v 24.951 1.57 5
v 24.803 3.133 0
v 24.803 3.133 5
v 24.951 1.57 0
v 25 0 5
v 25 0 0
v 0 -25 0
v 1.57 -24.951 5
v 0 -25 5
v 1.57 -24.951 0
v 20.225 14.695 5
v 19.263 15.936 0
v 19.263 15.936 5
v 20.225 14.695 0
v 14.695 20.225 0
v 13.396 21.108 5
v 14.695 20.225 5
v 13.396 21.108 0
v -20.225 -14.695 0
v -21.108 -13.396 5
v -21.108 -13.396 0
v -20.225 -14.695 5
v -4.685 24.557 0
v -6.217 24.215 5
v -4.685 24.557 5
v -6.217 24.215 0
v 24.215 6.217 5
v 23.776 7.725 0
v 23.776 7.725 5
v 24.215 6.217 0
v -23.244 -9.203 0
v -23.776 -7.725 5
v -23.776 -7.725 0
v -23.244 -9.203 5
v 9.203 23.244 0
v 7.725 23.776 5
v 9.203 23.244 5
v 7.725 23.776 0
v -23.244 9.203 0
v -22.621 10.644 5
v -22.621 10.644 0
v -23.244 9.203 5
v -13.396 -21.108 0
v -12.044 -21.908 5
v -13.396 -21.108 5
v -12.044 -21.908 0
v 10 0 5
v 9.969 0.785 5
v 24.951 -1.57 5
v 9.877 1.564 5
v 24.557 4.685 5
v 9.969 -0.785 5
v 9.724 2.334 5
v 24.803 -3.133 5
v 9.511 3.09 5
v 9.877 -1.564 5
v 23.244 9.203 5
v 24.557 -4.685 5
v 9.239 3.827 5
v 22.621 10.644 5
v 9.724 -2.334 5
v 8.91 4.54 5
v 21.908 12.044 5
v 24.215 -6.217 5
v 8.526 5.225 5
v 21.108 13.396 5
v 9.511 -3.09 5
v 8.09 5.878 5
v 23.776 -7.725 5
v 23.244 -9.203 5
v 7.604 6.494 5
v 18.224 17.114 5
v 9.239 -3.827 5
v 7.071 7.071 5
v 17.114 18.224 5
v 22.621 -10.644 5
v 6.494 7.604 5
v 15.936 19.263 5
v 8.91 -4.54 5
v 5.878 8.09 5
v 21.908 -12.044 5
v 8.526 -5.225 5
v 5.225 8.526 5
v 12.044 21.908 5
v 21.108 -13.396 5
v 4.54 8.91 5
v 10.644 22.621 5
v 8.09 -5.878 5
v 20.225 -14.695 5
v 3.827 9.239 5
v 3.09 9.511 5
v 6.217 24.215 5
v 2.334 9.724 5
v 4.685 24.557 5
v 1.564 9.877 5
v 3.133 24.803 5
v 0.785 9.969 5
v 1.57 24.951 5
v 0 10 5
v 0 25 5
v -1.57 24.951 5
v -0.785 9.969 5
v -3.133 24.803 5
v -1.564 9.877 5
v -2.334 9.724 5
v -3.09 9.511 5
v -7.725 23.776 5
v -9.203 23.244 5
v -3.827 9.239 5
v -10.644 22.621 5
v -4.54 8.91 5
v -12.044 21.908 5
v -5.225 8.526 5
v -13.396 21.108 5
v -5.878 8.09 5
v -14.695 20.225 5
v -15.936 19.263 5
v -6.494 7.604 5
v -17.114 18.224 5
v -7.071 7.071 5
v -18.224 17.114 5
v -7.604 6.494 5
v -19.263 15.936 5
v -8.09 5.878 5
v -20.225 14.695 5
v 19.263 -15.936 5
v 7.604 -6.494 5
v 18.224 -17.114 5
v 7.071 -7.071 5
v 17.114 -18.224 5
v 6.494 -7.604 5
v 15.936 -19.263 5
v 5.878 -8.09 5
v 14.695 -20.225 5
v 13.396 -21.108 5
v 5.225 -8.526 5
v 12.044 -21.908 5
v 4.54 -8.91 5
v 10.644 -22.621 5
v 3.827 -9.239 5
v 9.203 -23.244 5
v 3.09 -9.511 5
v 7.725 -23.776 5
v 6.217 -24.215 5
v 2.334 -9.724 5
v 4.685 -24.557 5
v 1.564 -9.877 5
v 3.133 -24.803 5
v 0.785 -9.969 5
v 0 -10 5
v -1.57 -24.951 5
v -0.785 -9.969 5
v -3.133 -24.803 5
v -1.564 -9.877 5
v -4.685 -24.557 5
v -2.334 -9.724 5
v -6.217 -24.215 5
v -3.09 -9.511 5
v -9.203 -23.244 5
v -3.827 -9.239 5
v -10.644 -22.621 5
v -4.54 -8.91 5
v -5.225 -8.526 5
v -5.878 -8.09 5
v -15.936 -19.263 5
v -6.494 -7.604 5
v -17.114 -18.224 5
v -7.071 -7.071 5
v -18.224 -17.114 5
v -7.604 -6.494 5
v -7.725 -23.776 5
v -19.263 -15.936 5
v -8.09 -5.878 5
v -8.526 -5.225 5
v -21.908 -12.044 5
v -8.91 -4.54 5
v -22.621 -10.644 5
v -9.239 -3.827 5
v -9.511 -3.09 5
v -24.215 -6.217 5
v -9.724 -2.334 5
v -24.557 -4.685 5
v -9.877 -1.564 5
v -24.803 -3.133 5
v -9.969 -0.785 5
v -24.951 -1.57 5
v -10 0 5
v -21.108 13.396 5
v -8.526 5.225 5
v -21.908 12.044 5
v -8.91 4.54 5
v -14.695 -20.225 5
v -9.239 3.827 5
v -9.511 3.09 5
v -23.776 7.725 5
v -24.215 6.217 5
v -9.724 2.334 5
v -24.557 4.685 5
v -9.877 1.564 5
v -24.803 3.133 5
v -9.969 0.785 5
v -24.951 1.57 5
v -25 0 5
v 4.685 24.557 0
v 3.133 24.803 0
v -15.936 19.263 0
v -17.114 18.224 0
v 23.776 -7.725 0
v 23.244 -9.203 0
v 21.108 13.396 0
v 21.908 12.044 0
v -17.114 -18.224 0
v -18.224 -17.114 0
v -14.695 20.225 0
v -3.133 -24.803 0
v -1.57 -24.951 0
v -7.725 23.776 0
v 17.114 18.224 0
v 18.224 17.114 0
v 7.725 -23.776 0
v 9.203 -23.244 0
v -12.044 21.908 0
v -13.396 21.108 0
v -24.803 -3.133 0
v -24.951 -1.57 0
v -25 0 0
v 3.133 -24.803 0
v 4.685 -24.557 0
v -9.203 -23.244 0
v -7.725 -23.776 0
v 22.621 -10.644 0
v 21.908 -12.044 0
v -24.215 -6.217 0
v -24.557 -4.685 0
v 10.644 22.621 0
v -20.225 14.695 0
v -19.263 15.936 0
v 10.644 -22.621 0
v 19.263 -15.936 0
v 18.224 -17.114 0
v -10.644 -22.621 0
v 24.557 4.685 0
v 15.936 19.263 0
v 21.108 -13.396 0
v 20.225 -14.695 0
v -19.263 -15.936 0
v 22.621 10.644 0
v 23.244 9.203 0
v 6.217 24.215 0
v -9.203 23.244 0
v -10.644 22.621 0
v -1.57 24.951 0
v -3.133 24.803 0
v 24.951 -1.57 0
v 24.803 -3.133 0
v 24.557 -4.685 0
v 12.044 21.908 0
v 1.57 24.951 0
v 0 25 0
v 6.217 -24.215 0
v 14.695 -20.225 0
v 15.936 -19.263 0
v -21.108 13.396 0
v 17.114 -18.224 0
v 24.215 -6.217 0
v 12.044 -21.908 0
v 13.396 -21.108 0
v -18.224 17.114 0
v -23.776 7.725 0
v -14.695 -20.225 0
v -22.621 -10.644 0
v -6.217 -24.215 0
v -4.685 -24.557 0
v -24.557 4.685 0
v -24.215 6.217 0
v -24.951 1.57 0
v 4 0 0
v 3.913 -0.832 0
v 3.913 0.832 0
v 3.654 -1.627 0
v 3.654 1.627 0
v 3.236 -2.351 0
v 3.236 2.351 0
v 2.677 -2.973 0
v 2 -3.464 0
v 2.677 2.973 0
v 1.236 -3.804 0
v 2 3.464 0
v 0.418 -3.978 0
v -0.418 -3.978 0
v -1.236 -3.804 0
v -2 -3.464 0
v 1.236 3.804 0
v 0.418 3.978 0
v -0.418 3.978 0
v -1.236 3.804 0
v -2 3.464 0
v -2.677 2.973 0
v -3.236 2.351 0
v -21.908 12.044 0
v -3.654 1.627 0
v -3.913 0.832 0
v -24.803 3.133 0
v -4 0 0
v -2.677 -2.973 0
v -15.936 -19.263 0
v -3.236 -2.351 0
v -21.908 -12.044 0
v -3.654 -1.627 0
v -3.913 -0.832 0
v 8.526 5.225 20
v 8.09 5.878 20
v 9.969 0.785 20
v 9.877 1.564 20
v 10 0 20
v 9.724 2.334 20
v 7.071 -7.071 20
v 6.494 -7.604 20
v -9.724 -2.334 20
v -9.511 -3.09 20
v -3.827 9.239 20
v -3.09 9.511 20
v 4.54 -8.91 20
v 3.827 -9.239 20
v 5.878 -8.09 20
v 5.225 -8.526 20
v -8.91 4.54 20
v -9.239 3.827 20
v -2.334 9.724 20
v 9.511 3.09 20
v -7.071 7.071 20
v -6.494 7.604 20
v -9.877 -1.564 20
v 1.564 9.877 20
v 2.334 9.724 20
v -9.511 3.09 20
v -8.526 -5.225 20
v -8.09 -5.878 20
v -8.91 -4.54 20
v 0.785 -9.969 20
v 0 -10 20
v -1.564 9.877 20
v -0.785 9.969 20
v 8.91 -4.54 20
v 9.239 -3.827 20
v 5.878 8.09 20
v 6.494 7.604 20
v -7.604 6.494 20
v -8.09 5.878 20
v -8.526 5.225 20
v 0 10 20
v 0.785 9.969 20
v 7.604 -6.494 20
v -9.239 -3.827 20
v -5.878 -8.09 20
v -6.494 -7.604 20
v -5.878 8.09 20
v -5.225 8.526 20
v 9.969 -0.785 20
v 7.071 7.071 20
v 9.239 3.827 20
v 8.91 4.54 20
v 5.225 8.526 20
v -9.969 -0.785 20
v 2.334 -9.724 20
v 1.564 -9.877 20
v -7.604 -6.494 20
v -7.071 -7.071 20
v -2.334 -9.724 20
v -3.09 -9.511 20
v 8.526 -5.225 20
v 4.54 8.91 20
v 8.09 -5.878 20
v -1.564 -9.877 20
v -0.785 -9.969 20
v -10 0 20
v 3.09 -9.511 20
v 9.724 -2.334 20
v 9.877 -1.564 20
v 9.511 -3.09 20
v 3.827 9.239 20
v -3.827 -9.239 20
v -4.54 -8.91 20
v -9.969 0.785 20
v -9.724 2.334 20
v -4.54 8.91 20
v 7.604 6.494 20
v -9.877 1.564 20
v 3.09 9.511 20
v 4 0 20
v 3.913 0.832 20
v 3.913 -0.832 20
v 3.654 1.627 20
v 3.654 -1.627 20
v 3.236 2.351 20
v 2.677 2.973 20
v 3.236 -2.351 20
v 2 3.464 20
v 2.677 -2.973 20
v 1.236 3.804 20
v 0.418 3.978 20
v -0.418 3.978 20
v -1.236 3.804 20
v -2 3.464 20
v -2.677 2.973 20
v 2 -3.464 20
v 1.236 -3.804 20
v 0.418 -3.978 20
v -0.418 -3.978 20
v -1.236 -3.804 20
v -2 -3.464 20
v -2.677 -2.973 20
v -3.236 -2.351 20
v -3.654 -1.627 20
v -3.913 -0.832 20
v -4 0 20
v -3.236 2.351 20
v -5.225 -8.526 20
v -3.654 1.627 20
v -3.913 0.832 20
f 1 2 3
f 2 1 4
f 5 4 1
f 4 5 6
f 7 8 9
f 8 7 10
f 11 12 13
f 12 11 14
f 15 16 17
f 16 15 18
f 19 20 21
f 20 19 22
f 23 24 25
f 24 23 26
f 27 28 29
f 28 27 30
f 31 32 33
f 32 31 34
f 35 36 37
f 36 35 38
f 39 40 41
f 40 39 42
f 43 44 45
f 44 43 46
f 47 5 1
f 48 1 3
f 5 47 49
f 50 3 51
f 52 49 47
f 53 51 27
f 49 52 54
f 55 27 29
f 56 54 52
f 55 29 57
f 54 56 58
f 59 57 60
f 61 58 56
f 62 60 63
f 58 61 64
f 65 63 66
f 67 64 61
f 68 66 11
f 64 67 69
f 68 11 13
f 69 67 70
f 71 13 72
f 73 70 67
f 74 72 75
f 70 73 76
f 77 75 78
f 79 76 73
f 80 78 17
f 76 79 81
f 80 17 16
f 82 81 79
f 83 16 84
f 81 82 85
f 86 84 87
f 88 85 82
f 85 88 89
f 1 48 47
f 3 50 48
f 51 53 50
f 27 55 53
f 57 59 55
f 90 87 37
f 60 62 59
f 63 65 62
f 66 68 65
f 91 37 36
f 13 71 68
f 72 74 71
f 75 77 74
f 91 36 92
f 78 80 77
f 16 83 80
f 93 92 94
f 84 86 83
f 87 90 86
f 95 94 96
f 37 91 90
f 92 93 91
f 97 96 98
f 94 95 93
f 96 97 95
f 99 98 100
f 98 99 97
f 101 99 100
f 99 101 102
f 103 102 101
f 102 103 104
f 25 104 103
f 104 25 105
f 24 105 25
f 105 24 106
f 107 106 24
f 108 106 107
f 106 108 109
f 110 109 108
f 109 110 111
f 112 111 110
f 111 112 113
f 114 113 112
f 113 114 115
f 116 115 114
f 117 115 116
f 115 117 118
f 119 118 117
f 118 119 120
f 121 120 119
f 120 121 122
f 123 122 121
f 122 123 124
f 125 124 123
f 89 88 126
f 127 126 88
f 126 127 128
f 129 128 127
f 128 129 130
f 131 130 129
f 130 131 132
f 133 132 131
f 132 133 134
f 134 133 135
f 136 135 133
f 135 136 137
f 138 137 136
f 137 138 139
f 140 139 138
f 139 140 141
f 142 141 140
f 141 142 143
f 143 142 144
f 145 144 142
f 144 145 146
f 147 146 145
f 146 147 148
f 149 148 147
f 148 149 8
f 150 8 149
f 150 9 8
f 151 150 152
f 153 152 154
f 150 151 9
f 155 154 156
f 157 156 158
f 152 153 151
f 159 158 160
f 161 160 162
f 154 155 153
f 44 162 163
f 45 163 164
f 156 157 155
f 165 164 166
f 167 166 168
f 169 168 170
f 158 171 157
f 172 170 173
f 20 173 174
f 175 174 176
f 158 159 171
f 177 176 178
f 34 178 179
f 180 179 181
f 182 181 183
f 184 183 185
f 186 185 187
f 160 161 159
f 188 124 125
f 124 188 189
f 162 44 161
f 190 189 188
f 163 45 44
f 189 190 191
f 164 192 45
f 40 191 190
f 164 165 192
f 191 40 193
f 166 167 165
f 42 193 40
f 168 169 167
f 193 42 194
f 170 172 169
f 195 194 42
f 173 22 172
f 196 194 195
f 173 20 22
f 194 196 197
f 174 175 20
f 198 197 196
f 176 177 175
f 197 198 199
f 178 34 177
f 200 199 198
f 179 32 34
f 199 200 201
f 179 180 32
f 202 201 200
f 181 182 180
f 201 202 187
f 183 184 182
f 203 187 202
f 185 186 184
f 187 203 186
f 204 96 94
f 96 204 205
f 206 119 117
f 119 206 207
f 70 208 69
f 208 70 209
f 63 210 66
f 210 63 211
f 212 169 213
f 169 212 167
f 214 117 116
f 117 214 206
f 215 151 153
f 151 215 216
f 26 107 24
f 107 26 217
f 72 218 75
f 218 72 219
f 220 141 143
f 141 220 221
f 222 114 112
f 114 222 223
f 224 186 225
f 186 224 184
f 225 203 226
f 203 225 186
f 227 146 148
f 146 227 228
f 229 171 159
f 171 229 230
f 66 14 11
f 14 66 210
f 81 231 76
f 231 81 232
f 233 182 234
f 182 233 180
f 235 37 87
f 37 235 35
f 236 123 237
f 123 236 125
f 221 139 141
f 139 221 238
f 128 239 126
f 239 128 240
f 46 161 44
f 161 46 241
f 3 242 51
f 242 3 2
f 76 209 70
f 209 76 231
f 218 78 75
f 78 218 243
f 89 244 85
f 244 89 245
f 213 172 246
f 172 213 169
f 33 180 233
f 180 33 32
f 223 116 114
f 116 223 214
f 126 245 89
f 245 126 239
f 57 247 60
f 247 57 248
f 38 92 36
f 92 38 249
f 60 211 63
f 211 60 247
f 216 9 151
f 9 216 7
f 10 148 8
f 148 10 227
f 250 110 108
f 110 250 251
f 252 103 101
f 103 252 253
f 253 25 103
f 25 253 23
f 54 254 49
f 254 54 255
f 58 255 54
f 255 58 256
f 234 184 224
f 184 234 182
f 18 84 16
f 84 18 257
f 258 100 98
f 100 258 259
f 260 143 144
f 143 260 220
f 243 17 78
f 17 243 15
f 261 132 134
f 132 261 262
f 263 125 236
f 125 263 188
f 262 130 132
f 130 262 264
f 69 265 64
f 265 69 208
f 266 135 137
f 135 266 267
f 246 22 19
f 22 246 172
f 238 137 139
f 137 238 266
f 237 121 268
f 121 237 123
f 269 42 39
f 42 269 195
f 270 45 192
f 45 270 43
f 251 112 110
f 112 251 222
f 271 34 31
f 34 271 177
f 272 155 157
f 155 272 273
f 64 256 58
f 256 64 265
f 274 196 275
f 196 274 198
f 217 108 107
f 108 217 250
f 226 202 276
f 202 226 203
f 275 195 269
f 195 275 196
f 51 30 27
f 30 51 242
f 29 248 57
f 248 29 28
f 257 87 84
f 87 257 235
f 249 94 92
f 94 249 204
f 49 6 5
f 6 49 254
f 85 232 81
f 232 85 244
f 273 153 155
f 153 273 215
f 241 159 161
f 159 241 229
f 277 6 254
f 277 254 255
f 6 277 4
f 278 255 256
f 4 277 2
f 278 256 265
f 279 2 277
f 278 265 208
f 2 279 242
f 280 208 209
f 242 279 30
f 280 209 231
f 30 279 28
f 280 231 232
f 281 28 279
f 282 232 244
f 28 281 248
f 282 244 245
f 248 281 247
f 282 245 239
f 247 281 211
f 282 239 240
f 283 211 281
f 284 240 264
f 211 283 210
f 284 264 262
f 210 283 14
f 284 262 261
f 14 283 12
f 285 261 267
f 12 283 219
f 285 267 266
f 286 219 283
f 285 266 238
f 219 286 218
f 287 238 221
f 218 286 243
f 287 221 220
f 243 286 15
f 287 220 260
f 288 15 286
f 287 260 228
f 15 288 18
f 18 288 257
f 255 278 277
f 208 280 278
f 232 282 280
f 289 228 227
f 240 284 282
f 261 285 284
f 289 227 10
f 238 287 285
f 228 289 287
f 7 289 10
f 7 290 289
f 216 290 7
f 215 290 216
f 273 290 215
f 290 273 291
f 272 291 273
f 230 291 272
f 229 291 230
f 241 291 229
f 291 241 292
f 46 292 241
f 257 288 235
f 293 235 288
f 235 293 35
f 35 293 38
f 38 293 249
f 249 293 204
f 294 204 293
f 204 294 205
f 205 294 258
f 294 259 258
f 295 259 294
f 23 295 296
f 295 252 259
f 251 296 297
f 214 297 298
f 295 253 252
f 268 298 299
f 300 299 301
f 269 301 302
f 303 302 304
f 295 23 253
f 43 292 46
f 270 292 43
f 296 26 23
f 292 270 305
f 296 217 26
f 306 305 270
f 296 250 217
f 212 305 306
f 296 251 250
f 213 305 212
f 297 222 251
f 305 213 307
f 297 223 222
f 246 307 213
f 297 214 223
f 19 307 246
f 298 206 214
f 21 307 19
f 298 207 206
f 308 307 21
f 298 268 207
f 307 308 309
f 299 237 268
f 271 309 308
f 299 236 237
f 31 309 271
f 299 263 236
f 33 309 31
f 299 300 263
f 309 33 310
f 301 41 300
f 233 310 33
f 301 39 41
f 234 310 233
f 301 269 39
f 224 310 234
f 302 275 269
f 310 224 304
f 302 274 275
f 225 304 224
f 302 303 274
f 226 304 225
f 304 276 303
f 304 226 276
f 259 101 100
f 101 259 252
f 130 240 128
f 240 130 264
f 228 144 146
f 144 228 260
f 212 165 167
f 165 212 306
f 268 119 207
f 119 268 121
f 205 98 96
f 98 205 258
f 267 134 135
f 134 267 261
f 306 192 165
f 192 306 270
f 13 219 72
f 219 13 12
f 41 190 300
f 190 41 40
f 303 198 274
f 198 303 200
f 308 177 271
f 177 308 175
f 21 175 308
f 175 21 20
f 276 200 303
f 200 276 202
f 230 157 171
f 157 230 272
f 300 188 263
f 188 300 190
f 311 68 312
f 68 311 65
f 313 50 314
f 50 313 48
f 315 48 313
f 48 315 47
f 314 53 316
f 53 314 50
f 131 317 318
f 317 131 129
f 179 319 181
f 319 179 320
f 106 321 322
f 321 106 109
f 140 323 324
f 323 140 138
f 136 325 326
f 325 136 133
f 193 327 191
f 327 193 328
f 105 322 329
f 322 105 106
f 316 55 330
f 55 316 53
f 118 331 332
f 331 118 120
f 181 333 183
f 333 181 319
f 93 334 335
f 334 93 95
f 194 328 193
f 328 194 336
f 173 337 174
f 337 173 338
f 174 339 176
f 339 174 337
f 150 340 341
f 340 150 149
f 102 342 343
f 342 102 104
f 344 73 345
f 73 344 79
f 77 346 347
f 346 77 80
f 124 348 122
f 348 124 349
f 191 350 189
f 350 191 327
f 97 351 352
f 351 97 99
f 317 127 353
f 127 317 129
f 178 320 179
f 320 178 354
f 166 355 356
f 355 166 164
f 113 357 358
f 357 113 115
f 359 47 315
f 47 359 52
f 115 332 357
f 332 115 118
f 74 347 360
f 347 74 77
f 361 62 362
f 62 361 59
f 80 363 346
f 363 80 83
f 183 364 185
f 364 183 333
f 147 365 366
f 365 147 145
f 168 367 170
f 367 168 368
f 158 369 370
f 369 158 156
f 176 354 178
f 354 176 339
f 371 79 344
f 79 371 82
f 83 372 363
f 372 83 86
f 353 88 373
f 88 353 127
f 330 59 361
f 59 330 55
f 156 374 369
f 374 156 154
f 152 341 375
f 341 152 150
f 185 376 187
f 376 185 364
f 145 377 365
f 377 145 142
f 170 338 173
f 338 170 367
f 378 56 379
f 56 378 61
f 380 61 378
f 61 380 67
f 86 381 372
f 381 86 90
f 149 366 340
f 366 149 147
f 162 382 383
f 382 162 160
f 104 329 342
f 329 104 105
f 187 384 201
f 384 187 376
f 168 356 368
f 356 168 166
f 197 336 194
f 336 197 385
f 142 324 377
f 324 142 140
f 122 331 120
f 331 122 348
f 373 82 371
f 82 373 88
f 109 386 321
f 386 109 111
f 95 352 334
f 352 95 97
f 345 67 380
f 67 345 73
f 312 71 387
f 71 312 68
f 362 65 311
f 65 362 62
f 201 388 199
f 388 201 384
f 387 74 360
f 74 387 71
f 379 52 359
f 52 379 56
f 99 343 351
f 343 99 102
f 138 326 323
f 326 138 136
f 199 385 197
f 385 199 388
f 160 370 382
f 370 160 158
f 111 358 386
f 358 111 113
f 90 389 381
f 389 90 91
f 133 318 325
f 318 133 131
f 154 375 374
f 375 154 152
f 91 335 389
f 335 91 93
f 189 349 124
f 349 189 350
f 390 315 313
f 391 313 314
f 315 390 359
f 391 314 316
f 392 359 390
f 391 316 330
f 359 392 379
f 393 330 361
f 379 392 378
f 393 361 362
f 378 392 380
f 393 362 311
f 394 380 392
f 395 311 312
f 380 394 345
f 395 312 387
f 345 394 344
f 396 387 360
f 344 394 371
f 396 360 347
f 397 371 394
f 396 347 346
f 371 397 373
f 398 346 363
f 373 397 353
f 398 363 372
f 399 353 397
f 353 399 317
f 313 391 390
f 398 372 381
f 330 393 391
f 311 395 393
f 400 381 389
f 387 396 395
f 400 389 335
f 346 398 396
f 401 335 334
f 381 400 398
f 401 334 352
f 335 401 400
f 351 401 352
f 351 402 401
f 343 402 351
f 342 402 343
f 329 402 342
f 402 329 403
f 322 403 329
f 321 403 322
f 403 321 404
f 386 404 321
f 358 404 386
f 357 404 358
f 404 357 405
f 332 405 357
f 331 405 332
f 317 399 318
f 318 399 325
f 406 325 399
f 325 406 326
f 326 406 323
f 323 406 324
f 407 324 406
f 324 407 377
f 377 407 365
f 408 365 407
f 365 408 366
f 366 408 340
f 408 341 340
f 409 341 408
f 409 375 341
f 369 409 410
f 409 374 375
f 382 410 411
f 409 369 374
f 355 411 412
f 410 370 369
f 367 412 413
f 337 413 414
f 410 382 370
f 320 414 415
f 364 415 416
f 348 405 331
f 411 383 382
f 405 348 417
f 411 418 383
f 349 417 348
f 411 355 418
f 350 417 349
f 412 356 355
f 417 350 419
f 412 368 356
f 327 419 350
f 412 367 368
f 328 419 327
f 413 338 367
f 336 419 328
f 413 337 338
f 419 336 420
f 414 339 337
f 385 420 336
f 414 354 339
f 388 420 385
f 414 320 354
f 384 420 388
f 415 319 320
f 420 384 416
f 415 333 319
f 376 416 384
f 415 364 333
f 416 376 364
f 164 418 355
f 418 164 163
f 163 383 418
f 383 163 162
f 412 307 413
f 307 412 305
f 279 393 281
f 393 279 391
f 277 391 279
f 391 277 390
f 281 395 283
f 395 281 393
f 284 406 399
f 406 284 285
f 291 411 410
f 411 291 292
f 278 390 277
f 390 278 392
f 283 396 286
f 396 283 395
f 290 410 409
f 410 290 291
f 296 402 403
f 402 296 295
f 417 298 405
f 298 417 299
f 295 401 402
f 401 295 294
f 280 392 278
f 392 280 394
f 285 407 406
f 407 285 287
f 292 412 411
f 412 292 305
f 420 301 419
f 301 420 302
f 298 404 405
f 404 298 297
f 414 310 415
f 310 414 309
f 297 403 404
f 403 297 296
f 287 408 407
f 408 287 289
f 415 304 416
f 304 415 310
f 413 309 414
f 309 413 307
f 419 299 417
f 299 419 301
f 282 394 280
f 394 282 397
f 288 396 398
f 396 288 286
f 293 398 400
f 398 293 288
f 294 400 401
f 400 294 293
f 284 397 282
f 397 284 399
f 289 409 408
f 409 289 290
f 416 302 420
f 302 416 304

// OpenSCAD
//----------------------------------------------------------
//-- Tutorial OpenScad
//-- Juan Gonzalez-Gomez (Obijuan) juan@iearobotics.com
//----------------------------------------------------------
//-- (c) Mayo, 2012
//-- Licencia GPL
//----------------------------------------------------------
//-- Ejemplo de cómo pegar piezas
//----------------------------------------------------------

//-- Rueda con portaejes y taladro para el eje
difference() {
  //-- Rueda
  union() {
    //-- Base de la rueda
    cylinder(r=50/2, h=5, $fn=100);
    //-- Portaejes
    cylinder(r=20/2, h=20, $fn=80);
  }
  //-- Taladro
  cylinder(r=8/2, h=80, $fn=30,center=true);
}
